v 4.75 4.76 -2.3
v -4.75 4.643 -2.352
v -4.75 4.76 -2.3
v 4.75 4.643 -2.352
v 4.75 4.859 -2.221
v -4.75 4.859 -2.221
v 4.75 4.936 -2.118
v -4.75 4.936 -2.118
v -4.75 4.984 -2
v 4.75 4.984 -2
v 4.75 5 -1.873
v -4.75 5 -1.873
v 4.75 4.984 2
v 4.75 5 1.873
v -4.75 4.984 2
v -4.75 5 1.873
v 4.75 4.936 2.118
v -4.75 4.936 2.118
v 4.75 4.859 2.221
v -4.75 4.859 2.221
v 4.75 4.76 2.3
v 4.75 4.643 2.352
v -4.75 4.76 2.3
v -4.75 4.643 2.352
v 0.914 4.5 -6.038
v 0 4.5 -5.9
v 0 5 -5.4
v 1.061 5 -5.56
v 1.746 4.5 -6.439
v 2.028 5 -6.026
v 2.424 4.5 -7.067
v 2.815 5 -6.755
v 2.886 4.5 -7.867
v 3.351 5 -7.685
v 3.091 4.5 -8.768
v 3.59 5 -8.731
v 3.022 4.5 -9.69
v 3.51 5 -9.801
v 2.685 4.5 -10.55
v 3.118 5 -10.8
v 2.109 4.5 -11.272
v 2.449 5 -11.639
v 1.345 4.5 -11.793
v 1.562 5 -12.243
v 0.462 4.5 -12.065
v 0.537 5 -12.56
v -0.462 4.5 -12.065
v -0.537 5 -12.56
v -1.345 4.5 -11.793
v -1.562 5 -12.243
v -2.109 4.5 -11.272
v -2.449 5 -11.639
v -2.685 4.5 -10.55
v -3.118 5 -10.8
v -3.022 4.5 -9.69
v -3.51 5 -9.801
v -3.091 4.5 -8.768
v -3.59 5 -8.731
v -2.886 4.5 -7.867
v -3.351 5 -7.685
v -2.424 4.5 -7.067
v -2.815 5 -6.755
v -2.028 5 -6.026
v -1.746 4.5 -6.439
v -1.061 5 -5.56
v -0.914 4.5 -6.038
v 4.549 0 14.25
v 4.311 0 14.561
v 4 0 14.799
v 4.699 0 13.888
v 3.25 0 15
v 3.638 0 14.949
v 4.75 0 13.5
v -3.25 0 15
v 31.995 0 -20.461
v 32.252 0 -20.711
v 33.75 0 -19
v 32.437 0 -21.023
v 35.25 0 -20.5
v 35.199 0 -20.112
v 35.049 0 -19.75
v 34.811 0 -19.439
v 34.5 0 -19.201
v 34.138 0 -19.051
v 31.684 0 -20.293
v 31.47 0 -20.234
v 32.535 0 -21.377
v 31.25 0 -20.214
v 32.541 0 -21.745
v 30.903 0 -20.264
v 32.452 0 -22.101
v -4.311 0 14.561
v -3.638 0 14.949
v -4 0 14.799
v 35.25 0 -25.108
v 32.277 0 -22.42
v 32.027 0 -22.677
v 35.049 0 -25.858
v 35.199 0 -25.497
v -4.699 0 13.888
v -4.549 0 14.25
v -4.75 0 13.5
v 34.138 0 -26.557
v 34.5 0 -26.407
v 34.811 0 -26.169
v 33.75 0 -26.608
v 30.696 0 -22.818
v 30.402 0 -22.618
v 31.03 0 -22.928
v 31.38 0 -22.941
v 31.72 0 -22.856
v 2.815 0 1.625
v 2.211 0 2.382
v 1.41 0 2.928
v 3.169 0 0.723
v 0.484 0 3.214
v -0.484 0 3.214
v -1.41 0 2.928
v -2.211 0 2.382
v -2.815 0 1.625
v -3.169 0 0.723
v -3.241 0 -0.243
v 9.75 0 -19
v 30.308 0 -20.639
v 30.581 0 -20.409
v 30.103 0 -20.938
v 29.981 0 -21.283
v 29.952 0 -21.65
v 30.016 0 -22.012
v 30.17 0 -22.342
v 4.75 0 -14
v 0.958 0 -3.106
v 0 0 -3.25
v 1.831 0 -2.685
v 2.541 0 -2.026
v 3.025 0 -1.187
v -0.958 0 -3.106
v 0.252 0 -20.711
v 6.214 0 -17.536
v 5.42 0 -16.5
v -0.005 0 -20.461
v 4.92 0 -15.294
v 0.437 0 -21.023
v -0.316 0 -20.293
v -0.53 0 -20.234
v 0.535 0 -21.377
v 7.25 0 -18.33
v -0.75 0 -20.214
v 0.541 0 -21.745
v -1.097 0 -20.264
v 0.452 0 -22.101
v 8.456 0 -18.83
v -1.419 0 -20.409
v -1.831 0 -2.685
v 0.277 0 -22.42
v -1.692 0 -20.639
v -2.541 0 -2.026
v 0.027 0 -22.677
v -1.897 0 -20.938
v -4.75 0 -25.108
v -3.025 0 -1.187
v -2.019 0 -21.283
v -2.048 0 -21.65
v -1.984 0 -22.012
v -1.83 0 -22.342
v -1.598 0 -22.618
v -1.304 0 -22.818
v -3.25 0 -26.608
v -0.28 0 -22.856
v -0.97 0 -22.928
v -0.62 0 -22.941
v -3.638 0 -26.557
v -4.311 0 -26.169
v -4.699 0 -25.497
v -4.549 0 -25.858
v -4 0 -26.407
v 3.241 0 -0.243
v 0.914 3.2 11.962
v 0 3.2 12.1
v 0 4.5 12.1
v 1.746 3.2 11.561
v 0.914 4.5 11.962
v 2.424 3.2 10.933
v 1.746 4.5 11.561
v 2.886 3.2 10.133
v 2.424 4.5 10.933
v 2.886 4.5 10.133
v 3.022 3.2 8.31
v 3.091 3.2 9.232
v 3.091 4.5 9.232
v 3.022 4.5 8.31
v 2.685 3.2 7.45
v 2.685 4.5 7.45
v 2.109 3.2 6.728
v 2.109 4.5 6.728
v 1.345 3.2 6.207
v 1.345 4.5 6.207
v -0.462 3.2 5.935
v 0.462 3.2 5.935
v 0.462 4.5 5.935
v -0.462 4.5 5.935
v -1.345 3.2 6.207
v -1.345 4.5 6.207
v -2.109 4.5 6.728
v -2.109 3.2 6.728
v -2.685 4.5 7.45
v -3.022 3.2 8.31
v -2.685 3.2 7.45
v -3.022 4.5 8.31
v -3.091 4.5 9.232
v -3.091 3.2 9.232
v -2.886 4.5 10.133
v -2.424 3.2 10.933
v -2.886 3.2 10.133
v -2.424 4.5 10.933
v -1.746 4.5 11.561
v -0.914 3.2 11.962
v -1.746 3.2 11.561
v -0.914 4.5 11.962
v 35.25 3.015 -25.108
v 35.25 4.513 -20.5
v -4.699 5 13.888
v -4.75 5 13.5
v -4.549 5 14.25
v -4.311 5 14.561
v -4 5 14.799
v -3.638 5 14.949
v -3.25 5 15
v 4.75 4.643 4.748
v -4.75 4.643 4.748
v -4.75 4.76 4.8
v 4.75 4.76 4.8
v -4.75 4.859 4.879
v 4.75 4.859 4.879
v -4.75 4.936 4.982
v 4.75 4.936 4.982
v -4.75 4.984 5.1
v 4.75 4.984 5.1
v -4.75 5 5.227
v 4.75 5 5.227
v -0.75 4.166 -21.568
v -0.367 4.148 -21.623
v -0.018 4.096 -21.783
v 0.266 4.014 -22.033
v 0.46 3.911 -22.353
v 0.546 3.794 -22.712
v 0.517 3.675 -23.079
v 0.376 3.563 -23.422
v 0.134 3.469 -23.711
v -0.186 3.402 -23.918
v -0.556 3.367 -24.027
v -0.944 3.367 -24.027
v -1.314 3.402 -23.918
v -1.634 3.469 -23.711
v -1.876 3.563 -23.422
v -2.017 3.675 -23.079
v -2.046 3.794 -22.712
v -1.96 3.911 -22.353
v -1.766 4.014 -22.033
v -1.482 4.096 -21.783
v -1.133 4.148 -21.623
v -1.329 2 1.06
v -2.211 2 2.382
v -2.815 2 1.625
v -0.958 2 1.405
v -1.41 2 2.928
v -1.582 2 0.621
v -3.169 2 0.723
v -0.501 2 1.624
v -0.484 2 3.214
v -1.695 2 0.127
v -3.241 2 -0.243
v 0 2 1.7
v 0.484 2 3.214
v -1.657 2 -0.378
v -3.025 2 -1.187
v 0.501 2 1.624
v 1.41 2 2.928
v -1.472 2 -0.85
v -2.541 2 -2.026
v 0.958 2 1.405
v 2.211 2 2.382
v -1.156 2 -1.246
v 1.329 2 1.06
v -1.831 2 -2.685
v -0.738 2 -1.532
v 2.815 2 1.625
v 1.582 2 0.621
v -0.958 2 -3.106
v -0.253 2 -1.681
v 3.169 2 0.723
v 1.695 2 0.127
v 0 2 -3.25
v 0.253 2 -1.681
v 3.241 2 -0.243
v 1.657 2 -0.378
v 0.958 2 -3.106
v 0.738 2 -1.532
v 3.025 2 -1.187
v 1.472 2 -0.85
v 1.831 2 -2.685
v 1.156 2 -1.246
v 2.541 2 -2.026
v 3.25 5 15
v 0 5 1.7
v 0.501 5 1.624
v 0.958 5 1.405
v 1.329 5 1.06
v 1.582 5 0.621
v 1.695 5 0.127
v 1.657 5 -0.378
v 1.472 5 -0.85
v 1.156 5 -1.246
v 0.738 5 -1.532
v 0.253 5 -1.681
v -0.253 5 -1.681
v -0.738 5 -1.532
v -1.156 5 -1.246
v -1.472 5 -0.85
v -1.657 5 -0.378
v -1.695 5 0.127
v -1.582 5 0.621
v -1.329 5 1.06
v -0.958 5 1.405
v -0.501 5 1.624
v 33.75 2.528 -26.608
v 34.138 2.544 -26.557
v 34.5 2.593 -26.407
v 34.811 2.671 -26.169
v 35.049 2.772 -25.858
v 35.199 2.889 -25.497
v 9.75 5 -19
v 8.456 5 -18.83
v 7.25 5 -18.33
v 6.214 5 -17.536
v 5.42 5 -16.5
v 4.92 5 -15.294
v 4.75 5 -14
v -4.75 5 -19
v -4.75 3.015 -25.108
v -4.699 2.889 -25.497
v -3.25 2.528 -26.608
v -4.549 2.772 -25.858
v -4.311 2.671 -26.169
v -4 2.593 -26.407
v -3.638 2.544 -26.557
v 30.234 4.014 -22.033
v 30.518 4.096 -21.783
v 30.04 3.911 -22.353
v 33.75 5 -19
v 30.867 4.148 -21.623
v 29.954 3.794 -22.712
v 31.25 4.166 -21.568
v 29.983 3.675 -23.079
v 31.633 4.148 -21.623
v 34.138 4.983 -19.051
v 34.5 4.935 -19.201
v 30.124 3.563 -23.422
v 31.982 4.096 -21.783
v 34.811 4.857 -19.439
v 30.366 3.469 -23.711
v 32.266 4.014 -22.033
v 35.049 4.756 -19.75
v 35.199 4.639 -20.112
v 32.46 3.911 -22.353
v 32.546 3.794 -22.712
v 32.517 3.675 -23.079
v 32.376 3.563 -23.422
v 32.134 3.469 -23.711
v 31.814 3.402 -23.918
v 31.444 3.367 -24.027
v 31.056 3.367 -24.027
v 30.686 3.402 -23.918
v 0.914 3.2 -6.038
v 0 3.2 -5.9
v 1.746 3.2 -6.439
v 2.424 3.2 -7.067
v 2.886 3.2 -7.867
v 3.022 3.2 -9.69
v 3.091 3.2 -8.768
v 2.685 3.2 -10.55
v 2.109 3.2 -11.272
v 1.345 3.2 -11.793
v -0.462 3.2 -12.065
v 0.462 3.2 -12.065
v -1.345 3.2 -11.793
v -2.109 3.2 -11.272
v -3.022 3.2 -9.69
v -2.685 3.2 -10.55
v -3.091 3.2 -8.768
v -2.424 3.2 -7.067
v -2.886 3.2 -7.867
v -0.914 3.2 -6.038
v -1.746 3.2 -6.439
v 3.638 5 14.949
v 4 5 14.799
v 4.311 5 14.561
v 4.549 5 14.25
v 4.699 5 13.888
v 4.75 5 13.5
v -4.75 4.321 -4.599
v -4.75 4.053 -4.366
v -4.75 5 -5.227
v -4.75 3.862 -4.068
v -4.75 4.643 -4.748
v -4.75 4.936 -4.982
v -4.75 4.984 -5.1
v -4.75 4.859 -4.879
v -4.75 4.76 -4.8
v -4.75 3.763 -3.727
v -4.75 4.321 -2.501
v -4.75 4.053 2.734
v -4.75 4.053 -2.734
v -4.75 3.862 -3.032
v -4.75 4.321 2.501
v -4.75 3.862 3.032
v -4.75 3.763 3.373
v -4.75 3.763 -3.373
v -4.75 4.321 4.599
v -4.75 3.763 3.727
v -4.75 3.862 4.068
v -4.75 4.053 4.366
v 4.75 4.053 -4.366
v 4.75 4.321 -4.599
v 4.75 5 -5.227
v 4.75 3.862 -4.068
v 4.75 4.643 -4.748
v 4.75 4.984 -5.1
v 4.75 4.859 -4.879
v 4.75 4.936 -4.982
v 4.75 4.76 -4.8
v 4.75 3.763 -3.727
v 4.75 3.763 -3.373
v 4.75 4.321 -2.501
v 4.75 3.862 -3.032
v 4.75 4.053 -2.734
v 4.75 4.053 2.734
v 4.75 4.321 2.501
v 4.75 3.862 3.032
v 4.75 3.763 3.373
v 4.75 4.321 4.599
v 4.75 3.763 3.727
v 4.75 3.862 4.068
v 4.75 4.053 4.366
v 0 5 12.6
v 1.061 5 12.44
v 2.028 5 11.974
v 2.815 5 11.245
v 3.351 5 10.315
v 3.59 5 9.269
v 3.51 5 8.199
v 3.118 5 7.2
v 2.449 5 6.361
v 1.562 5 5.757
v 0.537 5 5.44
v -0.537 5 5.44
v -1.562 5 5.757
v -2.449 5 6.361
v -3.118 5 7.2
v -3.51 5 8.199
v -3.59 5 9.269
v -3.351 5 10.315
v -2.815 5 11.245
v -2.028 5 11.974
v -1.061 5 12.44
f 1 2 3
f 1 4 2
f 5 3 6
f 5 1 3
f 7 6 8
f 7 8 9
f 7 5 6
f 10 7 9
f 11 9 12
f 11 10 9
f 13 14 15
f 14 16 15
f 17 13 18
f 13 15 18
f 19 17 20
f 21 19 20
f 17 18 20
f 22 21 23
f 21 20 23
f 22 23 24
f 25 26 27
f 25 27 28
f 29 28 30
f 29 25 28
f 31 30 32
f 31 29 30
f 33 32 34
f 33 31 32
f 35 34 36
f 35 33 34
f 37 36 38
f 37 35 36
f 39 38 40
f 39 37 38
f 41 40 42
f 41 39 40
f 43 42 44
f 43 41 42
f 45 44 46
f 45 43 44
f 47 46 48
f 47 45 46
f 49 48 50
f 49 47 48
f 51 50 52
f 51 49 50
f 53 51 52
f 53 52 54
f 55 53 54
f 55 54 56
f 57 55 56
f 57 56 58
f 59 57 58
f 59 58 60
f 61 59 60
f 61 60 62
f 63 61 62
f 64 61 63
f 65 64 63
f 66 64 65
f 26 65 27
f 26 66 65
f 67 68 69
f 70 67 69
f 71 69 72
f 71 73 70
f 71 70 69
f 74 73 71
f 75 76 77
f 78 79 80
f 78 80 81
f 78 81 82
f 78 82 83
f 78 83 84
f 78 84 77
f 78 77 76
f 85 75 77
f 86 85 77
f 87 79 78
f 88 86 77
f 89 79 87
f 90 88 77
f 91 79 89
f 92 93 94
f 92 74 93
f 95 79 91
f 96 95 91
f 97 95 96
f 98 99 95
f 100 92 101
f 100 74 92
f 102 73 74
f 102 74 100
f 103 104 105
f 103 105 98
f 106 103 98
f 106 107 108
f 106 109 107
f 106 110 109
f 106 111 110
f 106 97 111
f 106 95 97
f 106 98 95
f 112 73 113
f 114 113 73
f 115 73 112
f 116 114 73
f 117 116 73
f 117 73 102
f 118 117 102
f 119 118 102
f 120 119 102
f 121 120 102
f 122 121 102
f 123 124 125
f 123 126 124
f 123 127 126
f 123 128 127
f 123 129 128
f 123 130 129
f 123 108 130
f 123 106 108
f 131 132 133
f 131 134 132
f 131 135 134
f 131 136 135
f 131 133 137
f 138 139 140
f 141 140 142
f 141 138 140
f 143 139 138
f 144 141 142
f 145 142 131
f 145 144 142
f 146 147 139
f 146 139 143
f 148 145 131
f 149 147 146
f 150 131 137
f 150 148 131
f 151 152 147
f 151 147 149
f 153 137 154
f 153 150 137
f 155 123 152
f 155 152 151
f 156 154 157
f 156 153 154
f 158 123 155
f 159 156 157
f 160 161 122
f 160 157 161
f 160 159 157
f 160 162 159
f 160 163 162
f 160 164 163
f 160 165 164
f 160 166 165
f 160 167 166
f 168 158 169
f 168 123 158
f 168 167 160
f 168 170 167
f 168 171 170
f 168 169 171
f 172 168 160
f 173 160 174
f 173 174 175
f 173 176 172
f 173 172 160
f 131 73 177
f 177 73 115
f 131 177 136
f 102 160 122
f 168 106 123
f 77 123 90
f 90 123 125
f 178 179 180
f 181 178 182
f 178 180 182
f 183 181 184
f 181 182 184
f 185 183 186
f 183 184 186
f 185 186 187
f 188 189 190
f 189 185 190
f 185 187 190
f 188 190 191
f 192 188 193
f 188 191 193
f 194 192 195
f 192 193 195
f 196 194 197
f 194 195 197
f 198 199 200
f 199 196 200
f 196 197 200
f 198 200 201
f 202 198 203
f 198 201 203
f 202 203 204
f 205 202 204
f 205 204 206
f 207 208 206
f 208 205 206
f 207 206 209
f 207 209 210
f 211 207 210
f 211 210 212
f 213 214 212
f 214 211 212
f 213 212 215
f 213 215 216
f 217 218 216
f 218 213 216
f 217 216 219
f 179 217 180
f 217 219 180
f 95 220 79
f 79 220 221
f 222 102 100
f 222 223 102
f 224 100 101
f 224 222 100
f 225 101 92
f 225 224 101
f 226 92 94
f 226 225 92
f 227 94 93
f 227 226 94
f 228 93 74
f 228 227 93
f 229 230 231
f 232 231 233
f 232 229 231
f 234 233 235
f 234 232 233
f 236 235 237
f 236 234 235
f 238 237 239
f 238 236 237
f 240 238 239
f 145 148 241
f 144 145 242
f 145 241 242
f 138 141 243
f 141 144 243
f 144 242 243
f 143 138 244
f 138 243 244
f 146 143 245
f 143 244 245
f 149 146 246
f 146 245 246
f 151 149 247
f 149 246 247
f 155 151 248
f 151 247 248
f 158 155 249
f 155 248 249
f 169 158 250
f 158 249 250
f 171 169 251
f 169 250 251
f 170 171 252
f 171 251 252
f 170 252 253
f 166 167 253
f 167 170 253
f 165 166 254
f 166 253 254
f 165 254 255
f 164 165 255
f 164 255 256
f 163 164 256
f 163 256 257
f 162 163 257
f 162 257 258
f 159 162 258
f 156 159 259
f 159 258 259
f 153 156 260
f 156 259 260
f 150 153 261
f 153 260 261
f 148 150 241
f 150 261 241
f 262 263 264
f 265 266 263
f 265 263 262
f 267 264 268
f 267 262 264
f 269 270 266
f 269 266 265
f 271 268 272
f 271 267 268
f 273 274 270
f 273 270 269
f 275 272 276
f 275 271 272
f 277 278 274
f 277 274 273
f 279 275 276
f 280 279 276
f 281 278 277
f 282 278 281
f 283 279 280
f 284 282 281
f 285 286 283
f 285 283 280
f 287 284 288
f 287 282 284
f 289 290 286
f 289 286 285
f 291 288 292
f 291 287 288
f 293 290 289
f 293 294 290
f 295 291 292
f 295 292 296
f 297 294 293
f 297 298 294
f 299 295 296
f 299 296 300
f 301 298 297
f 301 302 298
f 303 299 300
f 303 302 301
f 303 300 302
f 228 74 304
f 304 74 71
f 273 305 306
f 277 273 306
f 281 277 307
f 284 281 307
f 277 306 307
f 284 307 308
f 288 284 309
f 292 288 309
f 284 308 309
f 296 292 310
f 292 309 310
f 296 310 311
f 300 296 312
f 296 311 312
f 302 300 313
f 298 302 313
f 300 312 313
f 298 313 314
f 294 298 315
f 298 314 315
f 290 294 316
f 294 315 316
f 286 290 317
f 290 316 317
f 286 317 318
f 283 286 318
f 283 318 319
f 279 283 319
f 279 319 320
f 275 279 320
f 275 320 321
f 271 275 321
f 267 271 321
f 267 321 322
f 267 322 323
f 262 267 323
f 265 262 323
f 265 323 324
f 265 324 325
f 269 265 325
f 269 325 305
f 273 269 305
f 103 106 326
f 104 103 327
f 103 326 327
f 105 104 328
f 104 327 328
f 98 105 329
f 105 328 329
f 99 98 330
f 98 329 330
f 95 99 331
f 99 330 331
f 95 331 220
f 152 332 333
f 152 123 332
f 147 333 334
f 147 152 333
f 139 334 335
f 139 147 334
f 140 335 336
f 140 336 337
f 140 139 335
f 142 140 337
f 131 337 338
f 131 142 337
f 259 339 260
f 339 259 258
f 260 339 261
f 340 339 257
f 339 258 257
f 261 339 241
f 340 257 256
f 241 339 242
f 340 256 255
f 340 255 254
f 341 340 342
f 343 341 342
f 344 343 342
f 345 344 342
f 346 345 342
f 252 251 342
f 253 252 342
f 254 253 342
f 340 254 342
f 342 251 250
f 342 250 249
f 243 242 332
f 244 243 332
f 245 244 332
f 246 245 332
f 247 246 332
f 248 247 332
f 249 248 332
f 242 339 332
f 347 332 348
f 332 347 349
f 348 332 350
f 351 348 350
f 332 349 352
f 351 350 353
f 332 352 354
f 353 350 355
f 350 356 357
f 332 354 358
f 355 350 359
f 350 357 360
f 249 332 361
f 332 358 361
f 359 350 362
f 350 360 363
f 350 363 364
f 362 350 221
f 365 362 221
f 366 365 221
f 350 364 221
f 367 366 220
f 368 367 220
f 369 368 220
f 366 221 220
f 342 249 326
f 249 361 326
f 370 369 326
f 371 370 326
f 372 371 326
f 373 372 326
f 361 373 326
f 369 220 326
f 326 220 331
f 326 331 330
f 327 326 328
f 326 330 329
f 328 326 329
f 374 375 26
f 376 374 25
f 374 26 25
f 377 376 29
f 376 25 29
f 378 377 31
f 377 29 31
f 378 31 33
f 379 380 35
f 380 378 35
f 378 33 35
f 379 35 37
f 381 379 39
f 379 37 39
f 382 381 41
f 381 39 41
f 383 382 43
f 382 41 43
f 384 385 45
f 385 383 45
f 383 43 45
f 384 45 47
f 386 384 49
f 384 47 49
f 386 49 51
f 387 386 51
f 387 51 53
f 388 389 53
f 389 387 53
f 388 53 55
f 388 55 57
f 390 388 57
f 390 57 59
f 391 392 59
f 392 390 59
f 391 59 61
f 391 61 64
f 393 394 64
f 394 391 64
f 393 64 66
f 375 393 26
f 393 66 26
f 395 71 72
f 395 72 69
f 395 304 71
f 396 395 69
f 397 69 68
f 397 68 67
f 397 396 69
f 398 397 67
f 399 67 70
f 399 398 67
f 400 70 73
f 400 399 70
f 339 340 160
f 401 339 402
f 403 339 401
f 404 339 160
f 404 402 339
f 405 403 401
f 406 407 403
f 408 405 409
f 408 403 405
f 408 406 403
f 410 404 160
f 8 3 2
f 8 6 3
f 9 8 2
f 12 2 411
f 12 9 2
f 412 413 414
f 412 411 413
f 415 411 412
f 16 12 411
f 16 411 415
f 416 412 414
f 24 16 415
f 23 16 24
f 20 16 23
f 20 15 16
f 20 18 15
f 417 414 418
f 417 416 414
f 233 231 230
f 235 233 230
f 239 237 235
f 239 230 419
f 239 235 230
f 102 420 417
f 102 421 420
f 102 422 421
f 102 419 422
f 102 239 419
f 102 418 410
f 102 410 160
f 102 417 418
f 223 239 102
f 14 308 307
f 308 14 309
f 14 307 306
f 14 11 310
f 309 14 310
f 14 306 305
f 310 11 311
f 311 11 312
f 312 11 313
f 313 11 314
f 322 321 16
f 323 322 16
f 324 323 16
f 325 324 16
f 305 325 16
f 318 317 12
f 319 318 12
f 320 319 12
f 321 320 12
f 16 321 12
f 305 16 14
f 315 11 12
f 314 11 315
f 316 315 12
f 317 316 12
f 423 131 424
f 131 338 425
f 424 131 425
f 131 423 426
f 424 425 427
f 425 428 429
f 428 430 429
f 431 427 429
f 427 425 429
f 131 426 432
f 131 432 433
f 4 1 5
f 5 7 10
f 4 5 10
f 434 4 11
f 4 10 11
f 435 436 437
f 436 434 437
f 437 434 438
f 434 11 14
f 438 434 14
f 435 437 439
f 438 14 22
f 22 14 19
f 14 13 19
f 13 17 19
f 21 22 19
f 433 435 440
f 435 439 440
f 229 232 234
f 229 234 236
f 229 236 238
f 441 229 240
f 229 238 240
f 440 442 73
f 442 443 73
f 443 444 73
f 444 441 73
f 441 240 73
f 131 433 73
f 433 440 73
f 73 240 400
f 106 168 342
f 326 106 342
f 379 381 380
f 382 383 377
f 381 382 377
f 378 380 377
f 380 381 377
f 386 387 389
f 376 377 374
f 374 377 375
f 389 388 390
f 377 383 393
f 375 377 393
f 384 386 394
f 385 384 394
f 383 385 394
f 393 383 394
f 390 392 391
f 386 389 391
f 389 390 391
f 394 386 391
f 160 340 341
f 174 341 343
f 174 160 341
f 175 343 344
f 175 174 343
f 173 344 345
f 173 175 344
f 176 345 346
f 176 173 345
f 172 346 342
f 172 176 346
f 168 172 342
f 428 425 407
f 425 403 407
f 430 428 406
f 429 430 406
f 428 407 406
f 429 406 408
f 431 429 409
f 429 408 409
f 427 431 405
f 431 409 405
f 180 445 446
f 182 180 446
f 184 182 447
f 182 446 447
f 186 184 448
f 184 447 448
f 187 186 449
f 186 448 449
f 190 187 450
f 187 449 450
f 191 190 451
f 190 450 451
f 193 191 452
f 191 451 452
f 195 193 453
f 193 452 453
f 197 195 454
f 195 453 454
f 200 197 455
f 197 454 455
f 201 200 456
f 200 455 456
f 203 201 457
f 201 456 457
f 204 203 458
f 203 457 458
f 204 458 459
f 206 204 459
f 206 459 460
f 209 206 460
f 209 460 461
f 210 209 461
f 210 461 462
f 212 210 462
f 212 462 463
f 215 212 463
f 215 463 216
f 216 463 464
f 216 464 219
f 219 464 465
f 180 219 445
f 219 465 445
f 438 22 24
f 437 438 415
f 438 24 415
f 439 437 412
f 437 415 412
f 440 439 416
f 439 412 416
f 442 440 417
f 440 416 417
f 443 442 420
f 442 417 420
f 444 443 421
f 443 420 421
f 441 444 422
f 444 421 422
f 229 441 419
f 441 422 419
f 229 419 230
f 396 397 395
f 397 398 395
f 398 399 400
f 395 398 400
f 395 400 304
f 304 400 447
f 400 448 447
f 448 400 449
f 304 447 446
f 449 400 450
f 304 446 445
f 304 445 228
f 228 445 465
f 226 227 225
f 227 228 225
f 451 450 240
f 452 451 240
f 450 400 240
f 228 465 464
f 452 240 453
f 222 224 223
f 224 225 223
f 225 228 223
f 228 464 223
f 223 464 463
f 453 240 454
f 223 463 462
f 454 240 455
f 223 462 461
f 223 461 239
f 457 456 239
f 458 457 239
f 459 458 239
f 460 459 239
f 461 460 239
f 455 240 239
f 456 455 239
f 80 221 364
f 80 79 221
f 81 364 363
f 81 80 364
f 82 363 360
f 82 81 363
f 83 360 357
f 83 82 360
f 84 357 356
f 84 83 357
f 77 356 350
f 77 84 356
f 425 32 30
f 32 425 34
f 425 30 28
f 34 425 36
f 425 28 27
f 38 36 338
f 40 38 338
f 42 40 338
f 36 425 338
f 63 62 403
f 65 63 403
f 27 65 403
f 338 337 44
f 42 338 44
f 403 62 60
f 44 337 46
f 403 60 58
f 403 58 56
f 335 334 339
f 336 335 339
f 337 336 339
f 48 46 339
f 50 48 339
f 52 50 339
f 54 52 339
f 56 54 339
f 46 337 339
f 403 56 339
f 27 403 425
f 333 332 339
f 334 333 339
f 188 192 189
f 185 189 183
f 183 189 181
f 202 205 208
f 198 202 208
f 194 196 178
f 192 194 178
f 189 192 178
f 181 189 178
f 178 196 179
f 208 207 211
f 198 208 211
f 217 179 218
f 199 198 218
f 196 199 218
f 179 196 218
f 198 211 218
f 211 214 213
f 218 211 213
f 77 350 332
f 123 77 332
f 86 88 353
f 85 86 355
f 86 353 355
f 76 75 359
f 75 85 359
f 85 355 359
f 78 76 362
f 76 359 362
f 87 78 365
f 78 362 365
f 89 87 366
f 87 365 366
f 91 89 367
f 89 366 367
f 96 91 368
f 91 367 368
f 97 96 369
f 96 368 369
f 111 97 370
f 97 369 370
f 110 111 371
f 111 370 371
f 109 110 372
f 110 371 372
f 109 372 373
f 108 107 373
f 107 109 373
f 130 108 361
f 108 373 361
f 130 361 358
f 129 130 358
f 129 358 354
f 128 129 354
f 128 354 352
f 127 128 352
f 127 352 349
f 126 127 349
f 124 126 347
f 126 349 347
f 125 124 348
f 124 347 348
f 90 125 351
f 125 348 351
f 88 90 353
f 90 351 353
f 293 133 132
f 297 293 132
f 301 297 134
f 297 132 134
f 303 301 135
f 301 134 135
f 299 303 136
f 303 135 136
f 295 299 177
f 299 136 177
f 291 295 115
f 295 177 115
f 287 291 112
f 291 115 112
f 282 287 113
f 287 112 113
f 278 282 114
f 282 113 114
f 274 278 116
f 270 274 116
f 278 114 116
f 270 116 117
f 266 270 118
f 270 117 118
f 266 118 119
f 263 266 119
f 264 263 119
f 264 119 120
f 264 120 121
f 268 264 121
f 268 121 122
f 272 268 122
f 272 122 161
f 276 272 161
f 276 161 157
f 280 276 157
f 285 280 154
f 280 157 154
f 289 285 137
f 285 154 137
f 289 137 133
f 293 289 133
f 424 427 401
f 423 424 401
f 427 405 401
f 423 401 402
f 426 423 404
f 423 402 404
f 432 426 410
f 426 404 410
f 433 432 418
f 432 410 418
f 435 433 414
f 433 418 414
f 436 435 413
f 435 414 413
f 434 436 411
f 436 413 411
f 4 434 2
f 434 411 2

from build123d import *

# Parameters (mm, degrees)
SKETCH1_W           = 9.5
SKETCH1_H           = 30
BOSS_EXTRUDE1_DEPTH = 5
SKETCH2_R           = 3.1
SKETCH2_R_2         = 1.7
CUT_EXTRUDE1_DEPTH  = 17.509466981
BOSS_EXTRUDE3_START = -3.2
SKETCH8_R           = 3.1
BOSS_EXTRUDE3_DEPTH = 3.2
CHAMFER1_SIZE       = 0.5
BOSS_EXTRUDE2_DEPTH = 5
CUT_EXTRUDE2_DEPTH  = 50.658836072
SKETCH6_R           = 1.3
CUT_EXTRUDE3_DEPTH  = 45.788689937
SKETCH9_W           = 2.39154787
SKETCH9_H           = 2.527864045
CUT_EXTRUDE4_DEPTH  = 50.658836072
FILLET2_R           = 1.5
FILLET1_R           = 5
SKETCH10_R          = 3.25
CUT_EXTRUDE5_DEPTH  = 2
SKETCH13_R          = 1.25
CUT_EXTRUDE6_DEPTH  = 49.301239371
FILLET3_R           = 0.5


with BuildPart() as part:
    # Sketch1 → Boss-Extrude1 (new body)
    with BuildSketch(Plane(origin=(0, 0, 0), x_dir=(1, 0, 0), z_dir=(0, 1, 0))):
        Rectangle(SKETCH1_W, SKETCH1_H)
    extrude(amount=BOSS_EXTRUDE1_DEPTH)

    # Sketch2 → Cut-Extrude1 (cut, through all)
    with BuildSketch(Plane(origin=(0, 5, 0), x_dir=(1, 0, 0), z_dir=(0, 1, 0))):
        with Locations(Location((0, 9, 0), (0, 0, 270))):
            Circle(SKETCH2_R)
        with Locations(Location((0, 0, 0), (0, 0, 270))):
            Circle(SKETCH2_R_2)
        with Locations(Location((0, -9, 0), (0, 0, 270))):
            Circle(SKETCH2_R)
    extrude(amount=-CUT_EXTRUDE1_DEPTH, mode=Mode.SUBTRACT)

    # Sketch8 → Boss-Extrude3 (add)
    with BuildSketch(Plane.XZ.offset(BOSS_EXTRUDE3_START)):
        with Locations(Location((0, 9, 0), (0, 0, 90))):
            Circle(SKETCH8_R)
        with Locations(Location((0, -9, 0), (0, 0, 90))):
            Circle(SKETCH8_R)
    extrude(amount=BOSS_EXTRUDE3_DEPTH)

    # Chamfer1
    chamfer1_edges = [part.edges().sort_by_distance(p)[0] for p in [
        (0, 5, -12.1),
        (0, 5, 5.9),
    ]]
    chamfer(chamfer1_edges, length=CHAMFER1_SIZE)

    # Sketch3 → Boss-Extrude2 (add)
    with BuildSketch(Plane(origin=(0, 5, 0), x_dir=(1, 0, 0), z_dir=(0, 1, 0))):
        Polygon((-4.75, 15), (-4.75, 19), (-4.75, 29), (35.25, 29), (35.25, 19), (4.75, 19), (4.75, 15), align=None)
    extrude(amount=-BOSS_EXTRUDE2_DEPTH)

    # Sketch5 → Cut-Extrude2 (cut, through all)
    with BuildSketch(Plane(origin=(35.25, 0, 0), x_dir=(0, 0, -1), z_dir=(1, 0, 0))):
        Polygon((19, 5), (29, 1.750803038), (29, 5), align=None)
    extrude(amount=-CUT_EXTRUDE2_DEPTH, mode=Mode.SUBTRACT)

    # Sketch6 → Cut-Extrude3 (cut, through all)
    with BuildSketch(Plane(origin=(0, 10.106502383, -3.283801684), x_dir=(1, 0, 0), z_dir=(0, 0.9510565162951556, -0.30901699437494123))):
        with Locations(Location((-0.75, 20.524988838, 0), (0, 0, 270))):
            Circle(SKETCH6_R)
        with Locations(Location((31.25, 20.524988838, 0), (0, 0, 270))):
            Circle(SKETCH6_R)
    extrude(amount=-CUT_EXTRUDE3_DEPTH, mode=Mode.SUBTRACT)

    # Sketch9 → Cut-Extrude4 (cut, through all)
    with BuildSketch(Plane(origin=(35.25, 0, 0), x_dir=(0, 0, -1), z_dir=(1, 0, 0))):
        with Locations((27.804226065, 1.263932023)):
            Rectangle(SKETCH9_W, SKETCH9_H)
    extrude(amount=-CUT_EXTRUDE4_DEPTH, mode=Mode.SUBTRACT)

    # Fillet2
    fillet2_edges = [part.edges().sort_by_distance(p)[0] for p in [
        (35.25, 2.5, -19),
        (4.75, 2.5, 15),
        (-4.75, 2.5, 15),
        (35.25, 1.263932023, -26.60845213),
        (-4.75, 1.263932023, -26.60845213),
    ]]
    fillet(fillet2_edges, radius=FILLET2_R)

    # Fillet1
    fillet1_edges = [part.edges().sort_by_distance(p)[0] for p in [
        (4.75, 2.5, -19),
    ]]
    fillet(fillet1_edges, radius=FILLET1_R)

    # Sketch10 → Cut-Extrude5 (cut)
    with BuildSketch(Plane.XZ):
        with Locations(Location((0, 0, 0), (0, 0, 270))):
            Circle(SKETCH10_R)
    extrude(amount=-CUT_EXTRUDE5_DEPTH, mode=Mode.SUBTRACT)

    # Sketch13 → Cut-Extrude6 (cut, through all)
    with BuildSketch(Plane.ZY.offset(4.75)):
        with Locations((-3.55, 5)):
            Circle(SKETCH13_R)
        with Locations((3.55, 5)):
            Circle(SKETCH13_R)
    extrude(amount=-CUT_EXTRUDE6_DEPTH, mode=Mode.SUBTRACT)

    # Fillet3
    fillet3_edges = [part.edges().sort_by_distance(p)[0] for p in [
        (0, 5, -4.8),
        (0, 5, -2.3),
        (0, 5, 4.8),
        (0, 5, 2.3),
    ]]
    fillet(fillet3_edges, radius=FILLET3_R)


solid = part.part
